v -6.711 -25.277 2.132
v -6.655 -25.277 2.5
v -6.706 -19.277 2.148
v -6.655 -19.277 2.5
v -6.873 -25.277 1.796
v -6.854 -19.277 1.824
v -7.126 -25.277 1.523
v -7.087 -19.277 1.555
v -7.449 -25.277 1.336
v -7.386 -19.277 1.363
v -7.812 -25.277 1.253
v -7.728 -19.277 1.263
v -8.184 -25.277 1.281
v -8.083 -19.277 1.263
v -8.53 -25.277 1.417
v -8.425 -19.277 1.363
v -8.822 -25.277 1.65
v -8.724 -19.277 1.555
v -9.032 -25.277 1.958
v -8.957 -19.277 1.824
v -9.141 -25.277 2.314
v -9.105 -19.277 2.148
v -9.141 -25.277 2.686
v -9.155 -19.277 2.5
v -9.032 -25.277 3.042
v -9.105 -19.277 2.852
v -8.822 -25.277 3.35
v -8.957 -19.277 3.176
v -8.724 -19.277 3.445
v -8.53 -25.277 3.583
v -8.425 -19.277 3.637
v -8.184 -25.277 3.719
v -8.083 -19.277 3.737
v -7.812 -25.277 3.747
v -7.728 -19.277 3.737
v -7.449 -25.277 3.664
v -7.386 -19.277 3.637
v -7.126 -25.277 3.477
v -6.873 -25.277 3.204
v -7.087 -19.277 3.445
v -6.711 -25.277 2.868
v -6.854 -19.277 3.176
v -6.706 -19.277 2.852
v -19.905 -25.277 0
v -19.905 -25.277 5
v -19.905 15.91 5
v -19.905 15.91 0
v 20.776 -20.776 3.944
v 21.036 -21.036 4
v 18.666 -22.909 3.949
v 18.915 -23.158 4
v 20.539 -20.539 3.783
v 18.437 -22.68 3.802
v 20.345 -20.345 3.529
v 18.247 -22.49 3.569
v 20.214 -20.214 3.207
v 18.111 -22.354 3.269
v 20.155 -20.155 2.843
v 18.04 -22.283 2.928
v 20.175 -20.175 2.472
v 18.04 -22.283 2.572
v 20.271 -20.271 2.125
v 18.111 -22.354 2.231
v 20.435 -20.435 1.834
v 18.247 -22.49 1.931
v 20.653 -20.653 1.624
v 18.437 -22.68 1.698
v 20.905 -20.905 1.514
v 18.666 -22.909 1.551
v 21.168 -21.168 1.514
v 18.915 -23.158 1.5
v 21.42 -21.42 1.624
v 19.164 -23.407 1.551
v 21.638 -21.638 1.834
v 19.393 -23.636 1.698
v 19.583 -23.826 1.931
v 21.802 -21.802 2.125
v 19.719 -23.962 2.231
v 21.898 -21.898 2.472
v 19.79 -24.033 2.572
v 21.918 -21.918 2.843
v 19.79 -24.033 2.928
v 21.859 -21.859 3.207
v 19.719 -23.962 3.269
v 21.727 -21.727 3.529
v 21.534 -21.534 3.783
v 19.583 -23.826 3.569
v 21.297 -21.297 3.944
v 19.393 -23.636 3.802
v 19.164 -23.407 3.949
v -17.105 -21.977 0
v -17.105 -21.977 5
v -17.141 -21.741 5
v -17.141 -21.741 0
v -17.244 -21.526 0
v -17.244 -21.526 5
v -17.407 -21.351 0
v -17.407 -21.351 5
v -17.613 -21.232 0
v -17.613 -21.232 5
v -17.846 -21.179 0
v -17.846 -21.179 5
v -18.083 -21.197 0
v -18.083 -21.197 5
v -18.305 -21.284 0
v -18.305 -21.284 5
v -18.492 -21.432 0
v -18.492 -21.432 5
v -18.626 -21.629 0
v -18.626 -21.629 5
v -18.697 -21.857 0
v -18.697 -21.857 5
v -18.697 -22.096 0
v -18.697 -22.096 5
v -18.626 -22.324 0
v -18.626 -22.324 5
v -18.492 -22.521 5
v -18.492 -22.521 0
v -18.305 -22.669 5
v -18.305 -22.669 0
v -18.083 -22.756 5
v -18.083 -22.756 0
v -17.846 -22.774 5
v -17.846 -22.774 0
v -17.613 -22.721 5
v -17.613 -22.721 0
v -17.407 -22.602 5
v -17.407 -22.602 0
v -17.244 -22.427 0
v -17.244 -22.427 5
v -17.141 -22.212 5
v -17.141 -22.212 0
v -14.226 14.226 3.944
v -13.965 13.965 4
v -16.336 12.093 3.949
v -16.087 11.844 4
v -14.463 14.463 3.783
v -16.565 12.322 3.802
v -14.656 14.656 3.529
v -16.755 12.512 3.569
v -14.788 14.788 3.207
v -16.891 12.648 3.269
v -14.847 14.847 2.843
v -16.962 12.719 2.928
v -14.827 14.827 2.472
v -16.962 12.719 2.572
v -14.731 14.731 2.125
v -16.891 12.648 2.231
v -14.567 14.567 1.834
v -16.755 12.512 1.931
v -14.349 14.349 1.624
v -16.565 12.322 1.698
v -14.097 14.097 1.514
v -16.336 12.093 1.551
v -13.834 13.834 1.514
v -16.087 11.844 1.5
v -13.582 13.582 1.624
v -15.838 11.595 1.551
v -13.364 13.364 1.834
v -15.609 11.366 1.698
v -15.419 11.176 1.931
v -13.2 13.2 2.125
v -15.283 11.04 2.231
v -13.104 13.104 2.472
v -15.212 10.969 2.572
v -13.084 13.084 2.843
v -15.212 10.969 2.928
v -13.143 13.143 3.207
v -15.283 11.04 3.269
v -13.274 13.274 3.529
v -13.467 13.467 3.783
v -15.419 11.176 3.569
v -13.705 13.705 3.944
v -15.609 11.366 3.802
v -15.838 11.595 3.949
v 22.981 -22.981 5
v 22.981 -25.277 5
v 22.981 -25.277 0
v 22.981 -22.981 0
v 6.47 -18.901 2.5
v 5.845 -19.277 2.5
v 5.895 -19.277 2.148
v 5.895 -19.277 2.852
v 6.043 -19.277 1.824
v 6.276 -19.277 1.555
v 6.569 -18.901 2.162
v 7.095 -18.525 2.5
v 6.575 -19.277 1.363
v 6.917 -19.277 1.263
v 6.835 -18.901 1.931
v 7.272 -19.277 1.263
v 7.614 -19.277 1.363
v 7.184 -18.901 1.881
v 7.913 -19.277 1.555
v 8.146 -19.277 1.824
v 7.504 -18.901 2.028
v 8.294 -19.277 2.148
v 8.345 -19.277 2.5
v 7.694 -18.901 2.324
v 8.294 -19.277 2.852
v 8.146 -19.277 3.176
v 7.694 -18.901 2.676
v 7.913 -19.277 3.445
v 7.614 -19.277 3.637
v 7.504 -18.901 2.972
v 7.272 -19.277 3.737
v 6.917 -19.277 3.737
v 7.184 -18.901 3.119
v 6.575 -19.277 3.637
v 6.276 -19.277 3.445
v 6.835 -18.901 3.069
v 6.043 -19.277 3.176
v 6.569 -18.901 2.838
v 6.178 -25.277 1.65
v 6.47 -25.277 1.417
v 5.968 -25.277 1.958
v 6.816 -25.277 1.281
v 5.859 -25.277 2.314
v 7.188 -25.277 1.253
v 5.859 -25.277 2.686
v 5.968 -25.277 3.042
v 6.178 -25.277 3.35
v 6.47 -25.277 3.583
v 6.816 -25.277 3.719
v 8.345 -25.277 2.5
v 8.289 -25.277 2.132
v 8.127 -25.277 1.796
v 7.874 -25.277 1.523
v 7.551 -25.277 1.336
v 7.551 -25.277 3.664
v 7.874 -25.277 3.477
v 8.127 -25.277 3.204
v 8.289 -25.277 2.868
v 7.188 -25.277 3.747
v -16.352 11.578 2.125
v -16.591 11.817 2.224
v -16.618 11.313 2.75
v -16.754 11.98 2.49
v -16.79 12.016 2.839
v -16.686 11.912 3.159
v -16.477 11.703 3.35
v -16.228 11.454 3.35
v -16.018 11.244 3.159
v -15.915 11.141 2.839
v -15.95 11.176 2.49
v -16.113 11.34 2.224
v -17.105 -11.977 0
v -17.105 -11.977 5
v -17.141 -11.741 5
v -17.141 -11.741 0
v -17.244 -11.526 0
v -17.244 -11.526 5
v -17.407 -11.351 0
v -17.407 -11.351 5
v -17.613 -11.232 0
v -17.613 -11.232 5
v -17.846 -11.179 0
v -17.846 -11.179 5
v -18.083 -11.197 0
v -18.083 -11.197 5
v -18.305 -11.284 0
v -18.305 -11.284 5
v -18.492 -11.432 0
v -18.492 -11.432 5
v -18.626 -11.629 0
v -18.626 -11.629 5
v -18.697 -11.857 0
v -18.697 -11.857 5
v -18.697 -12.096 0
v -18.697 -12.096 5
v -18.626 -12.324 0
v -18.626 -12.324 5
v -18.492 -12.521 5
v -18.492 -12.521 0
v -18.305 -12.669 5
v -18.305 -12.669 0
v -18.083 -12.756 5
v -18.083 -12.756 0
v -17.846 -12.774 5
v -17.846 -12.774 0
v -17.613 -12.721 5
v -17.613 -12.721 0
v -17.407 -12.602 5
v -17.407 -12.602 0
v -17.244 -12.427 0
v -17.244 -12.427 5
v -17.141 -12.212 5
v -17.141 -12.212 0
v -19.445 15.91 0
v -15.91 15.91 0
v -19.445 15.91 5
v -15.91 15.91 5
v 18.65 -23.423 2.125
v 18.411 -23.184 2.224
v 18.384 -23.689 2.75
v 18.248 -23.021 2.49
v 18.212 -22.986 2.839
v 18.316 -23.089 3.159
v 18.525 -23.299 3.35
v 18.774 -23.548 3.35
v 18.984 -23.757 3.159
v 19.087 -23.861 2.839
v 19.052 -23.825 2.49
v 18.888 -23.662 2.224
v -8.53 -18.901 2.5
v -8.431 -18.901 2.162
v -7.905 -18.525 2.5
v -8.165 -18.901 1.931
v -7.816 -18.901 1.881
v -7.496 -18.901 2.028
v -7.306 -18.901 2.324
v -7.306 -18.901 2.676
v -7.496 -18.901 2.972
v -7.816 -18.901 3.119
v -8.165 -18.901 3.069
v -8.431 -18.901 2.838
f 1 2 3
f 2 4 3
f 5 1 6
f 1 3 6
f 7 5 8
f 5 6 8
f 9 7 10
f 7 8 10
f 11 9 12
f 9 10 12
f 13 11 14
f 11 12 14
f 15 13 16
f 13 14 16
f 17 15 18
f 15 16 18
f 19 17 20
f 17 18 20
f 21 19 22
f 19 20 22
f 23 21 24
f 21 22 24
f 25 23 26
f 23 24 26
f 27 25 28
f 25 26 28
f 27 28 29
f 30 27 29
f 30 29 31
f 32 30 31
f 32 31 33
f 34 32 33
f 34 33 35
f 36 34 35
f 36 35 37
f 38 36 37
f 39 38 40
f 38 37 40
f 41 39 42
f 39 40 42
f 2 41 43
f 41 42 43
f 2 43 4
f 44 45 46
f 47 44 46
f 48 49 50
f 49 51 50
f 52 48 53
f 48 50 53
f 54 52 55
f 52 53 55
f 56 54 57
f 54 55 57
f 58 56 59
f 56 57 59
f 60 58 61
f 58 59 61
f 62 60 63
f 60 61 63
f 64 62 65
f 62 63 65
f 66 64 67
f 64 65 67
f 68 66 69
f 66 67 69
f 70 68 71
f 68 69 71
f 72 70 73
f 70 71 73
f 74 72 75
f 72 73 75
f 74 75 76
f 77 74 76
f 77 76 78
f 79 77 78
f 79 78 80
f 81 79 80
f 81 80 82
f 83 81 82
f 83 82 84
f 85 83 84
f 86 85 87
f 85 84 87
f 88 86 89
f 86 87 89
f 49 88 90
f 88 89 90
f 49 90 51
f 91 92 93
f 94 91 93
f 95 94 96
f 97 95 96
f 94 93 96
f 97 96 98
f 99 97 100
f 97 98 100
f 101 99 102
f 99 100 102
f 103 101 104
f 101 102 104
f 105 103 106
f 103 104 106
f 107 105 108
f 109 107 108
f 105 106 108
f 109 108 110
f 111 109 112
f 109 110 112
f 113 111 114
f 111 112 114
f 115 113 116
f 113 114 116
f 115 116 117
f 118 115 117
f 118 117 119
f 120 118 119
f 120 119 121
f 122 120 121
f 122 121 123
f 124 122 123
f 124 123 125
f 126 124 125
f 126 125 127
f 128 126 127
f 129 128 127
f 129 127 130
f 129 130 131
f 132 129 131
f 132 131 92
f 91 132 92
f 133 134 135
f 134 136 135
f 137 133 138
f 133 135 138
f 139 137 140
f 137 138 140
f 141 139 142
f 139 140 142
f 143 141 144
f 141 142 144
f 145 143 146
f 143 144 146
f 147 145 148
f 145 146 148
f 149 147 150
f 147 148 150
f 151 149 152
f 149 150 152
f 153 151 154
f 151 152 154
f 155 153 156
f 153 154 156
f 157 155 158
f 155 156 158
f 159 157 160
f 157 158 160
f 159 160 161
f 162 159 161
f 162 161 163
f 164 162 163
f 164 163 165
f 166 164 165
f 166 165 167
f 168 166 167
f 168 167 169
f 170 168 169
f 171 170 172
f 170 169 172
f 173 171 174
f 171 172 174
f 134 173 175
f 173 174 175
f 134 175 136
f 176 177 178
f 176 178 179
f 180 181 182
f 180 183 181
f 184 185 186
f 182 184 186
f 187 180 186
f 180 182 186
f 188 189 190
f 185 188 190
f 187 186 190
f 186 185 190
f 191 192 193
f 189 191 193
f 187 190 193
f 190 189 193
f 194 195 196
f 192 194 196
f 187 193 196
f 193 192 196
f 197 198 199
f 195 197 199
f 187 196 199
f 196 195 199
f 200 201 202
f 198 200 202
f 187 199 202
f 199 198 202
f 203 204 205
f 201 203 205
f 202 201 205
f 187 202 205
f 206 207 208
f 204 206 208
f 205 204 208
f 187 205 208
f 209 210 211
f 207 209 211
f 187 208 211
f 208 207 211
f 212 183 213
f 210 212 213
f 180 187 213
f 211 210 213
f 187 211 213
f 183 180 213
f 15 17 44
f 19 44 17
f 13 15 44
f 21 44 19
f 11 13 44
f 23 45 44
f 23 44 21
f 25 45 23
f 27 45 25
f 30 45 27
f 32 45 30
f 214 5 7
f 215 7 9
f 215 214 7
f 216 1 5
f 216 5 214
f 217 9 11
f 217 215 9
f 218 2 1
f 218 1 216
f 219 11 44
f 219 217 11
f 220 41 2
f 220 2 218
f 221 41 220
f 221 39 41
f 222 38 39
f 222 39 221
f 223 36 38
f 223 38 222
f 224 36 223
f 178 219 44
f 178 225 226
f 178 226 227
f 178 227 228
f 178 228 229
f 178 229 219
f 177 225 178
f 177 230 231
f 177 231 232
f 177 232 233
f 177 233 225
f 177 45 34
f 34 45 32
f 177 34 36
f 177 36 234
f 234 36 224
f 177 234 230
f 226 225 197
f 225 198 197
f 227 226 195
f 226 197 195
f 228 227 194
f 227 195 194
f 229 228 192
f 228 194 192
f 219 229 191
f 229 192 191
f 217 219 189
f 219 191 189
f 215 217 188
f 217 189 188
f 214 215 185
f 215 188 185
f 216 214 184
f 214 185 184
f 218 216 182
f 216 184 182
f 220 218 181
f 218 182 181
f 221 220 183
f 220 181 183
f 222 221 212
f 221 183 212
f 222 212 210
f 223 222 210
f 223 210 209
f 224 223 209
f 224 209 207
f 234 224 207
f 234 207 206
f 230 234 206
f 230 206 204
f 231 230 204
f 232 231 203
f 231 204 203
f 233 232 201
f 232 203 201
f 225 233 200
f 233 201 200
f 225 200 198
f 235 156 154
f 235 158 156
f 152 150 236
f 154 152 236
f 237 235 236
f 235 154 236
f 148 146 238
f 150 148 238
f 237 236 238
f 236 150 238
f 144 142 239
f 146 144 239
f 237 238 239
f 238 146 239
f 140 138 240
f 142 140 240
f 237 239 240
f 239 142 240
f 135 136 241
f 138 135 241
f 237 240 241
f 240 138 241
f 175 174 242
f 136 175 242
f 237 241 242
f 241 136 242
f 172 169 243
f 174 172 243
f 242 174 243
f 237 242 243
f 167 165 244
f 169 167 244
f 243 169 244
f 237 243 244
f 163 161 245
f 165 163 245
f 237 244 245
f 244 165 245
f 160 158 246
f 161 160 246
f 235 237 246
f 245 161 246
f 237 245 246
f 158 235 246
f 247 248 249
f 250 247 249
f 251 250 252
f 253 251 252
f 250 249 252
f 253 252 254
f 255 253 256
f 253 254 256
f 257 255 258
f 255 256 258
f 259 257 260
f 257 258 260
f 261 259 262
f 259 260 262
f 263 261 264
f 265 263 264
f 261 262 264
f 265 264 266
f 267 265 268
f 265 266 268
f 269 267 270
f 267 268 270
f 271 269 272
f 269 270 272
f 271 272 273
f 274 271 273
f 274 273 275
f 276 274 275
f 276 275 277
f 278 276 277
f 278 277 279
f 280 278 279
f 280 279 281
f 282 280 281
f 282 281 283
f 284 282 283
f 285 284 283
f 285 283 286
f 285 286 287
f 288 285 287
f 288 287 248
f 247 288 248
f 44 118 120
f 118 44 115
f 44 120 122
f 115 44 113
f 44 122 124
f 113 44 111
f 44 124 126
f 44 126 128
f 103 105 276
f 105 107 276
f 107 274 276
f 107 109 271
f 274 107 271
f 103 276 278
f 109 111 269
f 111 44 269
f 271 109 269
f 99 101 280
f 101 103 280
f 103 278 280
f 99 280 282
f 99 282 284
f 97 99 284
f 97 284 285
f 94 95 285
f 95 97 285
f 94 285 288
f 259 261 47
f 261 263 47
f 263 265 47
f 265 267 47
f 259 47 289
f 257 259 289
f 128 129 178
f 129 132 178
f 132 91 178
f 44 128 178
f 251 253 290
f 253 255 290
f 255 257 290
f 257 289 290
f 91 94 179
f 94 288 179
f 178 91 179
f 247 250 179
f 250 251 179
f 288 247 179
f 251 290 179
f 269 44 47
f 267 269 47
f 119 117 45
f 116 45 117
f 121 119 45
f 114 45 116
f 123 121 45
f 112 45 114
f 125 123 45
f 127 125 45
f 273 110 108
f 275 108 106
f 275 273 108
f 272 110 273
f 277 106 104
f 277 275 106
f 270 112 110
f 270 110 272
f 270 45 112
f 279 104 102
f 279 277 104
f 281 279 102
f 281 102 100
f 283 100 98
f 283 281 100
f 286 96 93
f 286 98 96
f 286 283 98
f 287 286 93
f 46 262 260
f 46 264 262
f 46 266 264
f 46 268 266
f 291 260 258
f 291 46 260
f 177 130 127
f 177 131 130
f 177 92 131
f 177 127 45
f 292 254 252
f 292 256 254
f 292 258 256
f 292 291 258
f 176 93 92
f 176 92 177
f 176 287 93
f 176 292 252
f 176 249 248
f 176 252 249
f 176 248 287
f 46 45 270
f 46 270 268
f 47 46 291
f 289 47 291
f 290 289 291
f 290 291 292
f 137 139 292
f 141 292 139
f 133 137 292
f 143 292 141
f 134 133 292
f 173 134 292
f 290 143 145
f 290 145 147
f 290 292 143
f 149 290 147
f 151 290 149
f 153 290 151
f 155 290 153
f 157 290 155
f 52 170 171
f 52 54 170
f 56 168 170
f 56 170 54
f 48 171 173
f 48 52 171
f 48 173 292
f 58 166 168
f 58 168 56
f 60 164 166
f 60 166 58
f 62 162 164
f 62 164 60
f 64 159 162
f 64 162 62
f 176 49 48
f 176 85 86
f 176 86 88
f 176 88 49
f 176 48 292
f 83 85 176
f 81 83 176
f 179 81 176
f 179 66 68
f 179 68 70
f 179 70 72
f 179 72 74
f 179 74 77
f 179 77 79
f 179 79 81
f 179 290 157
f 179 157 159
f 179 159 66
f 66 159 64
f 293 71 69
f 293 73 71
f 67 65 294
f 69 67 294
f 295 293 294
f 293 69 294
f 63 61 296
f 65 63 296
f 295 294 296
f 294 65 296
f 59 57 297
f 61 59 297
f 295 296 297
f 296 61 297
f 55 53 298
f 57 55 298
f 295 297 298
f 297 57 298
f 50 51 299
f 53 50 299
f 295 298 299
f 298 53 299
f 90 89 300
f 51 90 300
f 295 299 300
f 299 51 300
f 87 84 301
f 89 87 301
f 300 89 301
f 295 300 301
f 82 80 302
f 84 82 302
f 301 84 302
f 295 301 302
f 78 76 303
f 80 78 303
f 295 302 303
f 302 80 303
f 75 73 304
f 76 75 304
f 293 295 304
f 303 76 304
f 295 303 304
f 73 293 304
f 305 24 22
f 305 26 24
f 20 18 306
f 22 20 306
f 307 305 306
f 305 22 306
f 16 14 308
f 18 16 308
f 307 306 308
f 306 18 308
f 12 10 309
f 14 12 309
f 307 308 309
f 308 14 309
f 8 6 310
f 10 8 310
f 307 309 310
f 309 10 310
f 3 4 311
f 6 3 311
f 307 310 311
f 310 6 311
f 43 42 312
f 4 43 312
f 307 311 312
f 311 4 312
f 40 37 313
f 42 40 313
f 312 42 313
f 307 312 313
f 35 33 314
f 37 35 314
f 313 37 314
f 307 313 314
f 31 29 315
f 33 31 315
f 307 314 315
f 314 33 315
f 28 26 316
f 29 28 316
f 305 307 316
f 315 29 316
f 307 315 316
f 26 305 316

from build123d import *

# Parameters (mm, degrees)
BOSS_EXTRUDE1_DEPTH       = 5
M3X0_5_TAPPED_HOLE1_D     = 2.5
M3X0_5_TAPPED_HOLE1_DEPTH = 3
M3X0_5_TAPPED_HOLE1_TIP   = 0.751075774
BOSS_EXTRUDE2_DEPTH       = 5
CUT_EXTRUDE1_DEPTH        = 6
BOSS_EXTRUDE3_DEPTH       = 5
SKETCH12_W                = 42.426406872
SKETCH12_H                = 0.46
BOSS_EXTRUDE4_DEPTH       = 5
SKETCH13_W                = 0.46
SKETCH13_H                = 42.886406871
BOSS_EXTRUDE5_DEPTH       = 5
M2X0_4_TAPPED_HOLE1_D     = 1.6
SKETCH20_W                = 42.886406872
SKETCH20_H                = 1.7
CUT_EXTRUDE2_DEPTH        = 6
M3X0_5_TAPPED_HOLE3_D     = 2.5
M3X0_5_TAPPED_HOLE3_DEPTH = 6
M3X0_5_TAPPED_HOLE3_TIP   = 0.751075774


with BuildPart() as part:
    # Sketch2 → Boss-Extrude1 (new body)
    with BuildSketch(Plane.XY):
        Polygon((-19.445436483, 19.445436483), (26.516504294, -26.516504294), (-19.445436483, -26.516504294), align=None)
    extrude(amount=BOSS_EXTRUDE1_DEPTH)

    # M3x0.5 Tapped Hole1
    with Locations(Plane(origin=(0, 0, 0), x_dir=(0, 0, -1), z_dir=(0.707106781, 0.707106781, 0))):
        with Locations((-2.75, 19.75), (-2.75, -29.75)):
            Hole(M3X0_5_TAPPED_HOLE1_D / 2, depth=M3X0_5_TAPPED_HOLE1_DEPTH)
            with Locations((0, 0, -(M3X0_5_TAPPED_HOLE1_DEPTH + M3X0_5_TAPPED_HOLE1_TIP / 2))):  # 118° drill point
                Cone(0, M3X0_5_TAPPED_HOLE1_D / 2, M3X0_5_TAPPED_HOLE1_TIP, mode=Mode.SUBTRACT)

    # Sketch6 → Boss-Extrude2 (add, through all)
    with BuildSketch(Plane.XY.offset(5)):
        Polygon((-19.445436483, 19.445436483), (-15.909902577, 15.909902577), (-14.495689014, 17.324116139), (-18.03122292, 20.859650045), align=None)
        Polygon((26.516504294, -26.516504294), (22.980970389, -22.980970389), (24.395183951, -21.566756826), (27.930717857, -25.102290732), align=None)
    extrude(amount=-BOSS_EXTRUDE2_DEPTH)

    # Sketch7 → Cut-Extrude1 (cut, through all)
    with BuildSketch(Plane.XY.offset(5)):
        Polygon((-18.03122292, 20.859650045), (-14.495689014, 17.324116139), (-19.445436483, 12.374368671), (-19.445436483, 19.445436483), align=None)
        Polygon((24.395183951, -21.566756826), (19.445436483, -26.516504294), (26.516504294, -26.516504294), (27.930717857, -25.102290732), align=None)
    extrude(amount=-CUT_EXTRUDE1_DEPTH, mode=Mode.SUBTRACT)

    # Sketch11 → Boss-Extrude3 (add, through all)
    with BuildSketch(Plane(origin=(0, 0, 0), x_dir=(-1, 0, 0), z_dir=(0, 0, -1))):
        Polygon((-19.445436483, -26.516504294), (-22.980970389, -26.516504294), (-22.980970389, -22.980970389), align=None)
        Polygon((19.445436483, 12.374368671), (19.445436483, 15.909902577), (15.909902577, 15.909902577), align=None)
    extrude(amount=-BOSS_EXTRUDE3_DEPTH)

    # Sketch12 → Boss-Extrude4 (add, through all)
    with BuildSketch(Plane.XY.offset(5)):
        with Locations((1.767766953, -26.746504294)):
            Rectangle(SKETCH12_W, SKETCH12_H)
    extrude(amount=-BOSS_EXTRUDE4_DEPTH)

    # Sketch13 → Boss-Extrude5 (add, through all)
    with BuildSketch(Plane.XY.offset(5)):
        with Locations((-19.675436483, -5.533300859)):
            Rectangle(SKETCH13_W, SKETCH13_H)
    extrude(amount=-BOSS_EXTRUDE5_DEPTH)

    # M2x0.4 Tapped Hole1 (through all)
    with Locations(Plane(origin=(0, 0, 0), x_dir=(-1, 0, 0), z_dir=(0, 0, -1))):
        with Locations((17.905436483, -11.976504294), (17.905436483, -21.976504294)):
            Hole(M2X0_4_TAPPED_HOLE1_D / 2)

    # Sketch20 → Cut-Extrude2 (cut, through all)
    with BuildSketch(Plane.XY.offset(5)):
        with Locations((1.537766953, -26.126504294)):
            Rectangle(SKETCH20_W, SKETCH20_H)
    extrude(amount=-CUT_EXTRUDE2_DEPTH, mode=Mode.SUBTRACT)

    # M3x0.5 Tapped Hole3
    with Locations(Plane(origin=(0, -25.276504294, 0), x_dir=(-1, 0, 0), z_dir=(0, -1, 0))):
        with Locations((7.905436483, -2.5), (-7.094563517, -2.5)):
            Hole(M3X0_5_TAPPED_HOLE3_D / 2, depth=M3X0_5_TAPPED_HOLE3_DEPTH)
            with Locations((0, 0, -(M3X0_5_TAPPED_HOLE3_DEPTH + M3X0_5_TAPPED_HOLE3_TIP / 2))):  # 118° drill point
                Cone(0, M3X0_5_TAPPED_HOLE3_D / 2, M3X0_5_TAPPED_HOLE3_TIP, mode=Mode.SUBTRACT)


solid = part.part
